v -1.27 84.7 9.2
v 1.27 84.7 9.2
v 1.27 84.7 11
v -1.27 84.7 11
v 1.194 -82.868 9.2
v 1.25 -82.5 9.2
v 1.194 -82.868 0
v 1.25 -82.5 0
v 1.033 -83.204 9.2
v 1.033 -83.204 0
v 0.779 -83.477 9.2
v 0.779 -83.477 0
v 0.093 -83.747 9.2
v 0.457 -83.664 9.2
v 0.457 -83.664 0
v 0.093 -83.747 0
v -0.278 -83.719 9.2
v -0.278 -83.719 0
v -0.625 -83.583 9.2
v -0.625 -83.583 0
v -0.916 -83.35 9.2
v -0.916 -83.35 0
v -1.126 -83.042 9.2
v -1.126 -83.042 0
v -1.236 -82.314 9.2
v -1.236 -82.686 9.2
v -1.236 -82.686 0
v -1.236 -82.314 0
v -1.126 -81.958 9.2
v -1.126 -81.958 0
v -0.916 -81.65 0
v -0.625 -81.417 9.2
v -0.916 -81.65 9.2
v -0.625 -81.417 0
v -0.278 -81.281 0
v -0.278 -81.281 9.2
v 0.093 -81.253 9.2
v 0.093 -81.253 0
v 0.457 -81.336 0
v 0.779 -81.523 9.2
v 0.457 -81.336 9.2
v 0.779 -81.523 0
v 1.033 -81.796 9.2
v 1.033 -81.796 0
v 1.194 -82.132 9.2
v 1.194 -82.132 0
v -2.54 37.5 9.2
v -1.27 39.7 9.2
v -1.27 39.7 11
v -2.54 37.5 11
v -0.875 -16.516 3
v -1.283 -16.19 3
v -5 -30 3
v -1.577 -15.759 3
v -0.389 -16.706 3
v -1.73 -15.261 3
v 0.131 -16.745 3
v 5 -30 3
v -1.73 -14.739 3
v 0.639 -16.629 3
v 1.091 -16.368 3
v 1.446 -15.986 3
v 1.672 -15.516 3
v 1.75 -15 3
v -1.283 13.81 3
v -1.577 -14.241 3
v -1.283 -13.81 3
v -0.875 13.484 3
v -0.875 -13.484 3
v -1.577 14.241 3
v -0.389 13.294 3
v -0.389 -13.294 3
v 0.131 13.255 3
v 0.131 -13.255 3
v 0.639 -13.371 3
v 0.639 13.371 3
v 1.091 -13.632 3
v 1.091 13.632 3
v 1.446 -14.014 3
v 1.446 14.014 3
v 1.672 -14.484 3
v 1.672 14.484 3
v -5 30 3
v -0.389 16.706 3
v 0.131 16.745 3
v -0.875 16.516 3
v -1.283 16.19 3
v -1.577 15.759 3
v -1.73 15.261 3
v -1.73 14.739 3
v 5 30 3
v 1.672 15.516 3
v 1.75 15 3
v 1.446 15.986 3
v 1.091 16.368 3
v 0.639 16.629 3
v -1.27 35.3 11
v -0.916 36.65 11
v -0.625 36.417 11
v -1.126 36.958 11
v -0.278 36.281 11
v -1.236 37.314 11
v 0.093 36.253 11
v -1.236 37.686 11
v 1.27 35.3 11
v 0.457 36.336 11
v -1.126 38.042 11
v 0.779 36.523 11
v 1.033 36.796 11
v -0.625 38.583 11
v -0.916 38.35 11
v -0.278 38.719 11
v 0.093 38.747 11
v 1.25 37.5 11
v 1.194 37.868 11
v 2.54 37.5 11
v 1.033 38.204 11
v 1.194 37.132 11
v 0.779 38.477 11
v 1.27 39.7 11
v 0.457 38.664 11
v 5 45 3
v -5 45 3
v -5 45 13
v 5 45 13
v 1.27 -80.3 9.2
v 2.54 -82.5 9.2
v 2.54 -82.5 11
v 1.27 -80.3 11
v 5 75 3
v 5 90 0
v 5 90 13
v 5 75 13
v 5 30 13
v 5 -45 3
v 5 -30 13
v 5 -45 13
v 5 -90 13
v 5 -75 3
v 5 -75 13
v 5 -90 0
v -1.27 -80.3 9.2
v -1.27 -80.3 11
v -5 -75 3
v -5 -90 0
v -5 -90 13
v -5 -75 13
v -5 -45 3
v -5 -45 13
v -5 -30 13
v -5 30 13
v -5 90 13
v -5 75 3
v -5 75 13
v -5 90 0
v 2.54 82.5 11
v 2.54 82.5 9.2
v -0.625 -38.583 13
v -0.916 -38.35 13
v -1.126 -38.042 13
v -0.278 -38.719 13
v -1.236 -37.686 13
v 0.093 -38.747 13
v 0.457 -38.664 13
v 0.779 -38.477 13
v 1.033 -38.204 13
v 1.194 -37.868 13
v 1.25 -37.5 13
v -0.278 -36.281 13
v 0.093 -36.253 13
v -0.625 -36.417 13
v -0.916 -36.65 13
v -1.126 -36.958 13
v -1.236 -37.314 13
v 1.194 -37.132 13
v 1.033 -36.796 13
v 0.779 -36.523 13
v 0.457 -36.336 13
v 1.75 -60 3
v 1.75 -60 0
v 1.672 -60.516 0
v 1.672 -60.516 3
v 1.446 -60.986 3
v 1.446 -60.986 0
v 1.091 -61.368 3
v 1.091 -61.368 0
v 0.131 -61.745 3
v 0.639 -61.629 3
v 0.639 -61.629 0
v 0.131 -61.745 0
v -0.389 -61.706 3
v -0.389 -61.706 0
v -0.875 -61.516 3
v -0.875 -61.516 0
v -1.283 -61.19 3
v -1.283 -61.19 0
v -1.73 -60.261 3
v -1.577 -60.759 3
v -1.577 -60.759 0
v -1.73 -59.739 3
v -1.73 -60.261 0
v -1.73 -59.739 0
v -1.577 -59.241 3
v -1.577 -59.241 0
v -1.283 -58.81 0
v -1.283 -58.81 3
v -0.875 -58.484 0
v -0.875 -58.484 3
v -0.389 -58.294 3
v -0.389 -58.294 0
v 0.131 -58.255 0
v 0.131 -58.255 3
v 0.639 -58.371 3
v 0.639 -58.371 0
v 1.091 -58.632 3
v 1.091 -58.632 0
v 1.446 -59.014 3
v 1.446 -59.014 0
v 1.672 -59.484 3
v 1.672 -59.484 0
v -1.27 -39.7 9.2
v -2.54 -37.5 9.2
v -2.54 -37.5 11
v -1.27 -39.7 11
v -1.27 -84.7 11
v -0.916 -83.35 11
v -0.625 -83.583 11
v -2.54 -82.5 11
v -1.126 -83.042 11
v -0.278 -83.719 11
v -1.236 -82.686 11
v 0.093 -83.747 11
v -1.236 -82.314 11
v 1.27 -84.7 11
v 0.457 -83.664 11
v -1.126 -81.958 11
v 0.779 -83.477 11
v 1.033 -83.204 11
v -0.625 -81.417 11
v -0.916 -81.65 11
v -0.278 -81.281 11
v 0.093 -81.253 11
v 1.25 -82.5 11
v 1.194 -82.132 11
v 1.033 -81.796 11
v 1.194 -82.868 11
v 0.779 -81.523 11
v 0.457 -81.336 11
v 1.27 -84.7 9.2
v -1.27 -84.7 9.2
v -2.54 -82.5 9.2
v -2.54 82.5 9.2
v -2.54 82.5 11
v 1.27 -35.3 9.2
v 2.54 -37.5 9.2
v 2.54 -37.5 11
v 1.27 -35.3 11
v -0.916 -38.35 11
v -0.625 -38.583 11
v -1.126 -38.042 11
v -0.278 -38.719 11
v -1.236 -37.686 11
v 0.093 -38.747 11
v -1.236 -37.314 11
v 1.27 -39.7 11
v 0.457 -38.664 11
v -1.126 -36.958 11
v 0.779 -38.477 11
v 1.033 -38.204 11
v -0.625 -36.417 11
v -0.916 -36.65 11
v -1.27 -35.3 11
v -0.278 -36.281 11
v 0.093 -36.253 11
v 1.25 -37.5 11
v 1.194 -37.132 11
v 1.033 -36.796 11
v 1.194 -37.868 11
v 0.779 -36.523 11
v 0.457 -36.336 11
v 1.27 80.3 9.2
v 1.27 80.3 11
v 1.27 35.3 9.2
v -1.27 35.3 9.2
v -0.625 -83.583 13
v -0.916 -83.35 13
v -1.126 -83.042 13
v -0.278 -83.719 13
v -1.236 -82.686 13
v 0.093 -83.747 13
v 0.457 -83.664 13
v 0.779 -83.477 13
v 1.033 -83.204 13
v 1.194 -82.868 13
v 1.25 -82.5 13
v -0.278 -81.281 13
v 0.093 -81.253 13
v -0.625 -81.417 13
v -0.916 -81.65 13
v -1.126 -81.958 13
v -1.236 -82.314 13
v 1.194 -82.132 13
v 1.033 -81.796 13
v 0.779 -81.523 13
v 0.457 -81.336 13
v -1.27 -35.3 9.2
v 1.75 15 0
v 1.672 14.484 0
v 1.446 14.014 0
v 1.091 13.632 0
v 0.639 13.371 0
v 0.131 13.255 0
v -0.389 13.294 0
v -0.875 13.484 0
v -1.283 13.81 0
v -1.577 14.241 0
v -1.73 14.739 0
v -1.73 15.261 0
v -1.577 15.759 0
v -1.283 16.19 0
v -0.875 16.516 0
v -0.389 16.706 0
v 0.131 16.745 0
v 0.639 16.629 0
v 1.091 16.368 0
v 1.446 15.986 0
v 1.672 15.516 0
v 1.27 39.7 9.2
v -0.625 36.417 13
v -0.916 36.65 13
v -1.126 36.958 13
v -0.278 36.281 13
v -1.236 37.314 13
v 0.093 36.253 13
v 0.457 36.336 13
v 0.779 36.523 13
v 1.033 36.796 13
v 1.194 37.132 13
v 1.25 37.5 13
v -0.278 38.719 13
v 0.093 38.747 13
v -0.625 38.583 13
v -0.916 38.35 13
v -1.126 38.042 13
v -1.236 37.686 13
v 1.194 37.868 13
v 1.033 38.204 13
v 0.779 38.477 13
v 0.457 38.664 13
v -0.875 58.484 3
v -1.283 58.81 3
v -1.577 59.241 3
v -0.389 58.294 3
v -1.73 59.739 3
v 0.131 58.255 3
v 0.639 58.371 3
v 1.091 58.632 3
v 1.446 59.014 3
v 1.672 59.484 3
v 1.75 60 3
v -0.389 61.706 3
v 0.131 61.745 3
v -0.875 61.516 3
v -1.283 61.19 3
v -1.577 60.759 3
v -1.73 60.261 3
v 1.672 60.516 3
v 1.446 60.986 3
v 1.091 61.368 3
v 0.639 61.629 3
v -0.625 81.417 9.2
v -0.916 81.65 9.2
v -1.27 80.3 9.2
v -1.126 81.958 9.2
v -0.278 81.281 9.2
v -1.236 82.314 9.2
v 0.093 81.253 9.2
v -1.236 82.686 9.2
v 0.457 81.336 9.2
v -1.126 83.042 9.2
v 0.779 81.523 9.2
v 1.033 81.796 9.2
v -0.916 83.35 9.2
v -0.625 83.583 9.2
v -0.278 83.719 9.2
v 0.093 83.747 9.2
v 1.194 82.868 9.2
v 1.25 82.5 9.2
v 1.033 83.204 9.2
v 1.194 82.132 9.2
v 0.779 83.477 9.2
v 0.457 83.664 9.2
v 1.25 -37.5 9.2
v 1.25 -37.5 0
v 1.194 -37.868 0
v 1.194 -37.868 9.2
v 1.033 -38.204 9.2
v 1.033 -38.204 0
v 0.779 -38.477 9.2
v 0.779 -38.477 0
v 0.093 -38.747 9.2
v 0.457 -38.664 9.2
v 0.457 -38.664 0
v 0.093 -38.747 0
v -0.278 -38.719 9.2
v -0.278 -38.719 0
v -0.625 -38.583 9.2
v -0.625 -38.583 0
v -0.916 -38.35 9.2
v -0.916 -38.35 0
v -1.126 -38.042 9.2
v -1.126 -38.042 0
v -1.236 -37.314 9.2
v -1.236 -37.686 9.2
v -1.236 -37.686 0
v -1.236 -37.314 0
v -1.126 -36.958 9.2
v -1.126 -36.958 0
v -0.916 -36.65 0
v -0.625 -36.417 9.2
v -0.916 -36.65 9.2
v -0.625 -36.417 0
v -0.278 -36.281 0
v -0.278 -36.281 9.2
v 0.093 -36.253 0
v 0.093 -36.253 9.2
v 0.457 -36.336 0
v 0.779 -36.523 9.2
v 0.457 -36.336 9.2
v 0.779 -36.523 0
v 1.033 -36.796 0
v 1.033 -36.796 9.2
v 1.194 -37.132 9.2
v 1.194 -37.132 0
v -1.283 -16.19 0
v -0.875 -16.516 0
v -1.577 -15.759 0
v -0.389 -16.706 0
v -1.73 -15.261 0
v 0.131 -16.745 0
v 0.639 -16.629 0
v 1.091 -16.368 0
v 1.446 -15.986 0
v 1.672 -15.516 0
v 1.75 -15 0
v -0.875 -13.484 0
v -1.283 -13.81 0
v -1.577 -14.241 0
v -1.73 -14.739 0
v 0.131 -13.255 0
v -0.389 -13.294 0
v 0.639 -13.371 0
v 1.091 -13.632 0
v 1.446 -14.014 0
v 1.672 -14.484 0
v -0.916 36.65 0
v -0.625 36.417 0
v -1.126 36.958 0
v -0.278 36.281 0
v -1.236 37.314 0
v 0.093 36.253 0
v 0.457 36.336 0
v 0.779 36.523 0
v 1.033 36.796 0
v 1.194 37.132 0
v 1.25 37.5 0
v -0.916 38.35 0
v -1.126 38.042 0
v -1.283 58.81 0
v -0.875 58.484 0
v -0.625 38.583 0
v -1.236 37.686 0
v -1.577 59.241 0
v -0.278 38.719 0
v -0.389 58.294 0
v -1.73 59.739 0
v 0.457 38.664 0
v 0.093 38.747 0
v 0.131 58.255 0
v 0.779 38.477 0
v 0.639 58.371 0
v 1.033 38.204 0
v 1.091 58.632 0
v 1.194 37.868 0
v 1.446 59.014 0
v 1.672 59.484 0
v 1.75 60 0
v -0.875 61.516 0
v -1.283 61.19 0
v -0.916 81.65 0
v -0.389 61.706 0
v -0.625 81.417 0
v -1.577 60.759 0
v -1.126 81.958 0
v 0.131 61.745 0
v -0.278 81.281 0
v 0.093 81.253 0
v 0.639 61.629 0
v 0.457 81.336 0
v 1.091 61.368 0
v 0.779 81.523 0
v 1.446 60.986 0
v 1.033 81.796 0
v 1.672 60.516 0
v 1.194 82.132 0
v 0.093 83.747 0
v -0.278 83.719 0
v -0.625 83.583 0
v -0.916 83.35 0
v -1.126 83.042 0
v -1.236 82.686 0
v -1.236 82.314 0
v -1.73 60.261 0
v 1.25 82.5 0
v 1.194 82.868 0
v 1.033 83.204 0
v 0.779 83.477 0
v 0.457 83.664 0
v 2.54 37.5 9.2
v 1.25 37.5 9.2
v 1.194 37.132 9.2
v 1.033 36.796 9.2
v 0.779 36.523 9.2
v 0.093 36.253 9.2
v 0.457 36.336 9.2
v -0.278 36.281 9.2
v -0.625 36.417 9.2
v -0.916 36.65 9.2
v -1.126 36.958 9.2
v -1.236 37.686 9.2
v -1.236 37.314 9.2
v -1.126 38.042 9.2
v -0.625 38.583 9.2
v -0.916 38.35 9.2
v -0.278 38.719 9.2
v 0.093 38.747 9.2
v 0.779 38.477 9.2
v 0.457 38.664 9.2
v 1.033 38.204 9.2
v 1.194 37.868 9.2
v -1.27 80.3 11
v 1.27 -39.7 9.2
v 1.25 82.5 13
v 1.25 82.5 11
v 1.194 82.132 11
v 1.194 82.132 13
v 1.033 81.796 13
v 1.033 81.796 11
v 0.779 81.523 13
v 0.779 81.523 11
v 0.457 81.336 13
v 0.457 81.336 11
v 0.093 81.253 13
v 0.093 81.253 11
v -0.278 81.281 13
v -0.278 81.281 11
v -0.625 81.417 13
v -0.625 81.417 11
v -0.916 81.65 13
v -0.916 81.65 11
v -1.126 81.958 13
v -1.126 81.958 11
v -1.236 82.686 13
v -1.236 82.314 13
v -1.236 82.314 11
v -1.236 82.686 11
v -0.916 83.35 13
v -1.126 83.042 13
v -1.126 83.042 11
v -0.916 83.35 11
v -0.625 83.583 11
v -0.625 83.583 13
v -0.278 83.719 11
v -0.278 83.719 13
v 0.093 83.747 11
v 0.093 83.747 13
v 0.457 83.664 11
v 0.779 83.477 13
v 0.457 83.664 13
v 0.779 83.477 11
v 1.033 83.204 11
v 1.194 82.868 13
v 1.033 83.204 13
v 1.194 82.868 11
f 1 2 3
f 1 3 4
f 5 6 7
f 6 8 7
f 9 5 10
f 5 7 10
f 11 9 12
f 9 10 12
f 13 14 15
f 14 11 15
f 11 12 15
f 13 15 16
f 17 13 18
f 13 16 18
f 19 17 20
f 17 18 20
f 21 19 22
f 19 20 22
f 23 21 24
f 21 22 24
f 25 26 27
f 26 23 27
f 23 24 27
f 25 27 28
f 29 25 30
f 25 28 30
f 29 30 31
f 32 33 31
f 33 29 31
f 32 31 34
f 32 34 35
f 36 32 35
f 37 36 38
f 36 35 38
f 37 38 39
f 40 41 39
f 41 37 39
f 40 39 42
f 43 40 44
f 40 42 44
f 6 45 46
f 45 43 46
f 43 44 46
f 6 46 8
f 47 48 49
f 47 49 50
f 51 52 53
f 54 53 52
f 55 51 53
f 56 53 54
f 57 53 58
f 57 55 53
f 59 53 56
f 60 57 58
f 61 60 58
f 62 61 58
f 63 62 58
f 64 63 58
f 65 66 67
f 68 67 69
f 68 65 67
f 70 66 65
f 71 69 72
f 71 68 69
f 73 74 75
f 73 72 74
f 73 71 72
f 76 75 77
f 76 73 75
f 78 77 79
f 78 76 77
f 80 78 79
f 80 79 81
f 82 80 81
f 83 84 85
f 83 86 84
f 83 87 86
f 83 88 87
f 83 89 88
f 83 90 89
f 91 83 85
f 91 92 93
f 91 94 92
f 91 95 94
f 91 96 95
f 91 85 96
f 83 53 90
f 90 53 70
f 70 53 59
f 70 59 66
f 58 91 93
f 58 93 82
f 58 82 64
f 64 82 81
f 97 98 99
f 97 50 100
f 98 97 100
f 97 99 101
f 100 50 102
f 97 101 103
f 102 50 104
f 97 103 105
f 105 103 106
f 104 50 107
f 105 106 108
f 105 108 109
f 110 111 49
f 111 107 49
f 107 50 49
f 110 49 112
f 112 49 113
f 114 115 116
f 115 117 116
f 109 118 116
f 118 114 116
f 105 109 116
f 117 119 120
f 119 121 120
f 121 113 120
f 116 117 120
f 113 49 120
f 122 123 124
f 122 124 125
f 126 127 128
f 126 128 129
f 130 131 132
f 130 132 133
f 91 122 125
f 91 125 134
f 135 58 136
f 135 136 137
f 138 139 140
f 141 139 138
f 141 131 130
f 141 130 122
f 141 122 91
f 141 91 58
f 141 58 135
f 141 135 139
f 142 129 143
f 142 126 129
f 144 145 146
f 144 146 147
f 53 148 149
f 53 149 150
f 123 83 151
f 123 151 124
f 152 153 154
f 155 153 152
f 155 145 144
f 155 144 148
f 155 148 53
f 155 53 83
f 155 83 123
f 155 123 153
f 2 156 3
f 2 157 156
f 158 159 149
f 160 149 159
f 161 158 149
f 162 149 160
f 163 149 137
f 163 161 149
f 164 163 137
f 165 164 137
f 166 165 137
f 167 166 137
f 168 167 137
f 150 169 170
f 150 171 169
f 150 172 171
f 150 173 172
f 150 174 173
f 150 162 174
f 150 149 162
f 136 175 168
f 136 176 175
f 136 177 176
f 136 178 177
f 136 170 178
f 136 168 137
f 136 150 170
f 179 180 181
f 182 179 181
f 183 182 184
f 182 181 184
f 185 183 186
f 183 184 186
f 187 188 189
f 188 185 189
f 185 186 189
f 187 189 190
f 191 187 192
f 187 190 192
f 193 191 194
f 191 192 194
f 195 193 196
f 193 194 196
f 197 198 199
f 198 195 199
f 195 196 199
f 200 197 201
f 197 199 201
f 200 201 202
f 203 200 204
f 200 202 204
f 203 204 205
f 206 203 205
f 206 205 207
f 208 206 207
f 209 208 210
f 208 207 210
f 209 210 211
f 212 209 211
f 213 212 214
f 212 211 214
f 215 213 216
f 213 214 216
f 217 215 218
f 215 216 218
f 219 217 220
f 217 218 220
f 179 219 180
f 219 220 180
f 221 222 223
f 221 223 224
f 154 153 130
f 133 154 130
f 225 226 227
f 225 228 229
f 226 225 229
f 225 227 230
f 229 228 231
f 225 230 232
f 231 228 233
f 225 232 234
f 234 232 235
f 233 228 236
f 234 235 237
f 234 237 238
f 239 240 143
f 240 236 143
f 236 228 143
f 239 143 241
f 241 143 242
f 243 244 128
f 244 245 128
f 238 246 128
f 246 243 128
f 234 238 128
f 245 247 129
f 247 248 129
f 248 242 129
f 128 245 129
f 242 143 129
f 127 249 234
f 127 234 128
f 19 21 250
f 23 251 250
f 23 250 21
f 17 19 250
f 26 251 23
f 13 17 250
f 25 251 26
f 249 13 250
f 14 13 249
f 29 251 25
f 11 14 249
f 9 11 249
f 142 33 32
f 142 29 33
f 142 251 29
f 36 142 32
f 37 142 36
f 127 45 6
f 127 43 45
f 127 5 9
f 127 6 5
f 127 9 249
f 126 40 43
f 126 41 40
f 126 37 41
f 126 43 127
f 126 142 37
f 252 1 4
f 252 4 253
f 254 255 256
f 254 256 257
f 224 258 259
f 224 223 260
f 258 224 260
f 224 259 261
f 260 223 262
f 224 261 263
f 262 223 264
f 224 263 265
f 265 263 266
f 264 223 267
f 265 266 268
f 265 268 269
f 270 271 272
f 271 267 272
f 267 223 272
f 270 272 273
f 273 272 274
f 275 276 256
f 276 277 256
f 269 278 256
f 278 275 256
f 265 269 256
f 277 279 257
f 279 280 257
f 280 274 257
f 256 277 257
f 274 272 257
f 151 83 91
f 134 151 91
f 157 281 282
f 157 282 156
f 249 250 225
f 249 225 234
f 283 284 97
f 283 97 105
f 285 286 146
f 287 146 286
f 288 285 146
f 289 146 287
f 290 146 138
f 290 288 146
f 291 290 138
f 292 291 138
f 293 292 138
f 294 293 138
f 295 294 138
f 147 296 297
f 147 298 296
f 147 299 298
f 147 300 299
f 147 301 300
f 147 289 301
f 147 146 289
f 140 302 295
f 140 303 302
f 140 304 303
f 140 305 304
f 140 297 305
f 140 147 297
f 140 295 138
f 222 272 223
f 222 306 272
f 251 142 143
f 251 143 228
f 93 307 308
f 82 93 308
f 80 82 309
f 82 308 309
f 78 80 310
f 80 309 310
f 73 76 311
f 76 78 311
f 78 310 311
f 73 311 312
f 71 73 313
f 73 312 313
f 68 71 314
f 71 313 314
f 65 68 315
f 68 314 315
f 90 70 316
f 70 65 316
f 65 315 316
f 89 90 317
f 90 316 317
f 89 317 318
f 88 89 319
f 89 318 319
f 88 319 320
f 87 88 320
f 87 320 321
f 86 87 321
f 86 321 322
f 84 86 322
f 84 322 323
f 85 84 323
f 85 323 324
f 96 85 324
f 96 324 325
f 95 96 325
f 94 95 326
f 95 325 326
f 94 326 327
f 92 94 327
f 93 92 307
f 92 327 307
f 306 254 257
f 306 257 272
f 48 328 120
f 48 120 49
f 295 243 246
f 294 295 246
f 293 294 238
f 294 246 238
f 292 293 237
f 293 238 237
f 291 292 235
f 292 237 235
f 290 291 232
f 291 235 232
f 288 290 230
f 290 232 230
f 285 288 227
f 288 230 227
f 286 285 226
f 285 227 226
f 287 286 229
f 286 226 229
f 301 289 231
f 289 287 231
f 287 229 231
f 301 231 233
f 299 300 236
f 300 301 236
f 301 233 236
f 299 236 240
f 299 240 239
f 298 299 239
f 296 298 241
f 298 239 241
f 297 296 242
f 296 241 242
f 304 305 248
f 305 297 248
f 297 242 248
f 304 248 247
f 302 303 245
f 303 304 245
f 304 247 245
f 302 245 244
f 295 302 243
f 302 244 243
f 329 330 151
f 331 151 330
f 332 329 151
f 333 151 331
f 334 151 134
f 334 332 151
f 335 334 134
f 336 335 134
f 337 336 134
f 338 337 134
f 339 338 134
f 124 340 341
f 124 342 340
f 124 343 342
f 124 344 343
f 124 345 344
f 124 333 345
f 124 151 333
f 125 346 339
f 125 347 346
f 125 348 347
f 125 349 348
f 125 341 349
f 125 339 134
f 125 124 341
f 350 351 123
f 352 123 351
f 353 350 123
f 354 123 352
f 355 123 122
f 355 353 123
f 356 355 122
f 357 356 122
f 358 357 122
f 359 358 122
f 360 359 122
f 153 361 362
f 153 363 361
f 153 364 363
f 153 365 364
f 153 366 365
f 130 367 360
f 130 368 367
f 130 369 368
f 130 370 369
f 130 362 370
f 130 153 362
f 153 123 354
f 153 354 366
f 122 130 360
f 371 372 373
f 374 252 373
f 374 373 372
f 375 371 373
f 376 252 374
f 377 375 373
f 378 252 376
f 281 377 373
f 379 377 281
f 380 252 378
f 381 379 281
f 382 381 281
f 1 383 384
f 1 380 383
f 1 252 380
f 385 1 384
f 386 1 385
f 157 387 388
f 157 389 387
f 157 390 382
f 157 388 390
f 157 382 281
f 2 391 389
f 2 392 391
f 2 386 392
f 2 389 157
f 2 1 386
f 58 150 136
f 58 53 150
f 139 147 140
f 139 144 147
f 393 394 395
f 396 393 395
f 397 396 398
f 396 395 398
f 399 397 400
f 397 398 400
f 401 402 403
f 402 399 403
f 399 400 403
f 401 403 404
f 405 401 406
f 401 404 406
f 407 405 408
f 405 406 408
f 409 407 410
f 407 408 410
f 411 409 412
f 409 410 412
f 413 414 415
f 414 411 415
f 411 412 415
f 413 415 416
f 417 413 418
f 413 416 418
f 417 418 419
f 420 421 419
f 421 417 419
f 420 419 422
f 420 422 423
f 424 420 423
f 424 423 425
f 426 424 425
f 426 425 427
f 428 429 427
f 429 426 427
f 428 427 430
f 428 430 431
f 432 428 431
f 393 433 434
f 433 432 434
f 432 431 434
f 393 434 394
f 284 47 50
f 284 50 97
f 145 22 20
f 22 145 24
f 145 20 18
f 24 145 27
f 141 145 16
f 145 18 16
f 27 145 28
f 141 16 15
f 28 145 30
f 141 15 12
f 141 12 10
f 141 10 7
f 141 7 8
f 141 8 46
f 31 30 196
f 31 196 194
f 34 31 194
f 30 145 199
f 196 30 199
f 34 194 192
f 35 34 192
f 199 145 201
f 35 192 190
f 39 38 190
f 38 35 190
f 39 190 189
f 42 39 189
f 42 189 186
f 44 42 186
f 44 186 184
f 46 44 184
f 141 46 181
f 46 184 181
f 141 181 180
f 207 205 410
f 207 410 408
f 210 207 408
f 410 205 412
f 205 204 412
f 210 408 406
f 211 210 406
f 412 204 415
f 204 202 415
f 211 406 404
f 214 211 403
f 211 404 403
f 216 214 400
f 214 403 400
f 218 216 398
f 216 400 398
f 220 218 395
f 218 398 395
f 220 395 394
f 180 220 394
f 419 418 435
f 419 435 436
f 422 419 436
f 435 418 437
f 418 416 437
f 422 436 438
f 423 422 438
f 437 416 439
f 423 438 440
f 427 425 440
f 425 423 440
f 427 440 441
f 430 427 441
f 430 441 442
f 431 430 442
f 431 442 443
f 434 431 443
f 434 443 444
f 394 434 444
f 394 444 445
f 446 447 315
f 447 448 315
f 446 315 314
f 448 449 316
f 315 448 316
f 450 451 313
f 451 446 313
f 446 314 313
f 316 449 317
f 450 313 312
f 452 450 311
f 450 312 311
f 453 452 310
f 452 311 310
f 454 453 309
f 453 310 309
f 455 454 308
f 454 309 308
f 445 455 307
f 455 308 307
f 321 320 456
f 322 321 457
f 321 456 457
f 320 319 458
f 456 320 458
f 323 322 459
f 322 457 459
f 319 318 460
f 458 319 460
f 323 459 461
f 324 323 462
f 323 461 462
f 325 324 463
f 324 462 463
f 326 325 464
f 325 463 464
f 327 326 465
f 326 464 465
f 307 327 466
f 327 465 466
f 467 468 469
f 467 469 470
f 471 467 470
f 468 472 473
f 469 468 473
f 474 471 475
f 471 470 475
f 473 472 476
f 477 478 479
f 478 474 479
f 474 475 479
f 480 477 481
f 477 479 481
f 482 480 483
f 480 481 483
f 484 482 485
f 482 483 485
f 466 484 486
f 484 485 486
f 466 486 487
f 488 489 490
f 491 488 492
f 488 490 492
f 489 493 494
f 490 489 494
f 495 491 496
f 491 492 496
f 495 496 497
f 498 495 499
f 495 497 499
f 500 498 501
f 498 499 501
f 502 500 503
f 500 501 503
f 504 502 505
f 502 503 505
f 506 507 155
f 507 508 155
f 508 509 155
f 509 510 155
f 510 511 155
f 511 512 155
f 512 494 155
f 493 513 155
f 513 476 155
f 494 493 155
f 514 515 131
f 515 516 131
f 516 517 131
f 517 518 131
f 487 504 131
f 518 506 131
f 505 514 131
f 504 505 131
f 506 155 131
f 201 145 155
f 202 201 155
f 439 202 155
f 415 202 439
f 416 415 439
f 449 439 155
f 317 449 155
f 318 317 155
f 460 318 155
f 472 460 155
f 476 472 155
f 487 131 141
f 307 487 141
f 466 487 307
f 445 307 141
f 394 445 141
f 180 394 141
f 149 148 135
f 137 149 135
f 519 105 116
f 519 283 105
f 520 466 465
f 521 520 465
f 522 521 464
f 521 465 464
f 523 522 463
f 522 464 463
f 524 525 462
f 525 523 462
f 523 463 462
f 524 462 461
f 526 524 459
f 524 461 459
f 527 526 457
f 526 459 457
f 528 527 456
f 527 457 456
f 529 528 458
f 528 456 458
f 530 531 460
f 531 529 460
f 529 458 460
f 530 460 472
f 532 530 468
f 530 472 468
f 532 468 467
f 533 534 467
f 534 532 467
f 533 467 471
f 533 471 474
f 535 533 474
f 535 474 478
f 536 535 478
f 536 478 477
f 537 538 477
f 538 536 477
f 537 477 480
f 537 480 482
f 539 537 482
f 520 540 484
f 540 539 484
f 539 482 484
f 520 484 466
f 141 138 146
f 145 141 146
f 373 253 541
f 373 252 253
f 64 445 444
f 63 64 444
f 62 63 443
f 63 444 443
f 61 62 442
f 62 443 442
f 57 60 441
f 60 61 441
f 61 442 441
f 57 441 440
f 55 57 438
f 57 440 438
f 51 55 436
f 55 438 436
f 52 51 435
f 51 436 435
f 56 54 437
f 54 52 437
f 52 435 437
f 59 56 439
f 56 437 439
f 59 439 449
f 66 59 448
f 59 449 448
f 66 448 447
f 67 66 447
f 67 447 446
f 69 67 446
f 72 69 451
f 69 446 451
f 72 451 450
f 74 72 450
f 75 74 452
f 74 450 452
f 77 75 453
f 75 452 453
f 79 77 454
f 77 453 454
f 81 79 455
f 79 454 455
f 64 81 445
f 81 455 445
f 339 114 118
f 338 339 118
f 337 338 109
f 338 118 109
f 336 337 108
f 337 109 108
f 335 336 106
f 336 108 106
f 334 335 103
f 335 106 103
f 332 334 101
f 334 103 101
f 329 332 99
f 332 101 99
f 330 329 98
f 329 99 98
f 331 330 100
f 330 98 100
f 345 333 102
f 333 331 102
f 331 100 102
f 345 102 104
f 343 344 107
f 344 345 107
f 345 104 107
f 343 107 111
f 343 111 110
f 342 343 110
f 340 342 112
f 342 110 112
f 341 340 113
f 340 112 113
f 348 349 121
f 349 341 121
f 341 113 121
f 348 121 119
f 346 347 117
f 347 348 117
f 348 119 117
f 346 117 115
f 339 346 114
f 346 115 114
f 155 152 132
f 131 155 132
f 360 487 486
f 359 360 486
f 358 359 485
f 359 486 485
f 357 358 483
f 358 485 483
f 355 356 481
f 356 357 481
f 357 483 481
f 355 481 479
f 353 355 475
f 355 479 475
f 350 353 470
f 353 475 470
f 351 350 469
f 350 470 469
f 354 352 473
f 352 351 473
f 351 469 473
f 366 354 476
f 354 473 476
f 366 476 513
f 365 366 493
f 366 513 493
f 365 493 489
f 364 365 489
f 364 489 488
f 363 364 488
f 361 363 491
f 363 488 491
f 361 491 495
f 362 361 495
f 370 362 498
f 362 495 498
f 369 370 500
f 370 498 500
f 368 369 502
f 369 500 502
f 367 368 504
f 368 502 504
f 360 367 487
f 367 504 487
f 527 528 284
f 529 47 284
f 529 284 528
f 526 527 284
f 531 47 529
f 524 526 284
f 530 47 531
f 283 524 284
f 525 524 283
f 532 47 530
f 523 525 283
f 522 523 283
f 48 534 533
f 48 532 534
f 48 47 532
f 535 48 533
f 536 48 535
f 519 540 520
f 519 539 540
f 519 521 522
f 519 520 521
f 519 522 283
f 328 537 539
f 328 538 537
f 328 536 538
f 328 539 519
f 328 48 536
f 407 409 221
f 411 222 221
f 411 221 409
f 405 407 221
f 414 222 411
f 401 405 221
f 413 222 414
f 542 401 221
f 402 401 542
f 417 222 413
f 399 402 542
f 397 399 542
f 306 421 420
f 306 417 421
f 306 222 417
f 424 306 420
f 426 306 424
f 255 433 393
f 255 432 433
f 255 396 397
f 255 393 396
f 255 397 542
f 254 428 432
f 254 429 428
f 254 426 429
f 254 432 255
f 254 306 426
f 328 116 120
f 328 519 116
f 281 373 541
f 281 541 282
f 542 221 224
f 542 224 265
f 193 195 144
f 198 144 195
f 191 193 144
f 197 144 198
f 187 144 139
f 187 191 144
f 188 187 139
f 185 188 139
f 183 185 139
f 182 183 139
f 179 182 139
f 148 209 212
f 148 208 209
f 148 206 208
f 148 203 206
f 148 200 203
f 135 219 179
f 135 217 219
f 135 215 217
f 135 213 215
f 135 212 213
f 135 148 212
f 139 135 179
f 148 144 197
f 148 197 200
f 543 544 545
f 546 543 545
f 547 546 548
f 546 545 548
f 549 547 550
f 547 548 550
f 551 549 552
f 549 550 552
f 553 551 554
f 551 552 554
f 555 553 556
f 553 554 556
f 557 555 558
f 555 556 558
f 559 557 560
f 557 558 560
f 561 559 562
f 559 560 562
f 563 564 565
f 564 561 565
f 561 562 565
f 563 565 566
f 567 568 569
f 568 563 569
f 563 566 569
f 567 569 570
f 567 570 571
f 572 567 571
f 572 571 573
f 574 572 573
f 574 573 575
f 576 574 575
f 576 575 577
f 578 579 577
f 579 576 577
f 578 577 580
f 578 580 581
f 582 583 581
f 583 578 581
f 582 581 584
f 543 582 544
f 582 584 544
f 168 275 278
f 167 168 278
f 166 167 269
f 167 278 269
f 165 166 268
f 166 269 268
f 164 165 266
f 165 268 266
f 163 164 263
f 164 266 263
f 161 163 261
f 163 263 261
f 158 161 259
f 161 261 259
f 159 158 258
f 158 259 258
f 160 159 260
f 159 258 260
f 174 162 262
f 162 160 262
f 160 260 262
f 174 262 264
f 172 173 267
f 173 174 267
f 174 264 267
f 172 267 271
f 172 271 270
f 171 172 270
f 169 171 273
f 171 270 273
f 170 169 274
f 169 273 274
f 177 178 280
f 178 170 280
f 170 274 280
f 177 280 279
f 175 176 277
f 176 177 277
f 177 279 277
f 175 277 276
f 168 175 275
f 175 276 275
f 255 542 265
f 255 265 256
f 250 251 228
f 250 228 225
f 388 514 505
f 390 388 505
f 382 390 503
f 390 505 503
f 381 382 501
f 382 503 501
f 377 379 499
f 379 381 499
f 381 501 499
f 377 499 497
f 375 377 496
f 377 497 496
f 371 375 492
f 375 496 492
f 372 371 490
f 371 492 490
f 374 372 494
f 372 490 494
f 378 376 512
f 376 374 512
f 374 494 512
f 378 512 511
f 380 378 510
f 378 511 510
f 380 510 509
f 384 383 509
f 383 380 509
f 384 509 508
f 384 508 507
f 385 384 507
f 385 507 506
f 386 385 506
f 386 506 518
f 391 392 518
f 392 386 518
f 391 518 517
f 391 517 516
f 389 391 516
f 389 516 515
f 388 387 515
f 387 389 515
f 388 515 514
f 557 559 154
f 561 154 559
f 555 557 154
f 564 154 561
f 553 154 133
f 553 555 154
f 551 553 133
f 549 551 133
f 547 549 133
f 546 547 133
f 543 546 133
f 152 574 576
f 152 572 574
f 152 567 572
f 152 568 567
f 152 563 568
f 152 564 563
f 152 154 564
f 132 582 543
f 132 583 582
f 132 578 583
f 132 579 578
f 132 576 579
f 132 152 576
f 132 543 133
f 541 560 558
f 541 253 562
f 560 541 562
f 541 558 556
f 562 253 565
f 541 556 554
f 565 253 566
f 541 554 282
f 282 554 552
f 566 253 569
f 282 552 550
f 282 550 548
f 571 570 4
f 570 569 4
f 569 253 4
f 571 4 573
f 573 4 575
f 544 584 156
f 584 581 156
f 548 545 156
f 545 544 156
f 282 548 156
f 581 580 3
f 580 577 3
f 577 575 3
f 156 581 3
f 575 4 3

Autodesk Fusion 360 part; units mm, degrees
sketch "Skizze1" plane through (0, 0, 0) normal (0, 0, 1) x (1, 0, 0)
  line L0 (0, 118.8766) -> (0, -120.4869) construction
  line L1 (5, -90) -> (-5, -90)
  line L2 (-5, -90) -> (-5, 90)
  line L3 (-5, 90) -> (5, 90)
  line L4 (5, 90) -> (5, -90)
  line L5 (5, -90) -> (-5, 90) construction
  line L6 (-5, -90) -> (5, 90) construction
  circle A0 centre (0, 37.5) radius 1.25
  circle A1 centre (0, -37.5) radius 1.25
  circle A2 centre (0, 15) radius 1.75
  circle A3 centre (0, -15) radius 1.75
  circle A4 centre (0, 60) radius 1.75
  circle A5 centre (0, -60) radius 1.75
  line L7 (-5, 30) -> (5, 30)
  line L8 (-5, -30) -> (5, -30)
  line L9 (-5, -45) -> (5, -45)
  line L10 (-5, 45) -> (5, 45)
  line L11 (1.2702, -39.7) -> (2.5403, -37.5)
  line L12 (2.5403, -37.5) -> (1.2702, -35.3)
  line L13 (1.2702, -35.3) -> (-1.2702, -35.3)
  line L14 (-1.2702, -35.3) -> (-2.5403, -37.5)
  line L15 (-2.5403, -37.5) -> (-1.2702, -39.7)
  line L16 (-1.2702, -39.7) -> (1.2702, -39.7)
  line L17 (1.2702, 35.3) -> (2.5403, 37.5)
  line L18 (2.5403, 37.5) -> (1.2702, 39.7)
  line L19 (1.2702, 39.7) -> (-1.2702, 39.7)
  line L20 (-1.2702, 39.7) -> (-2.5403, 37.5)
  line L21 (-2.5403, 37.5) -> (-1.2702, 35.3)
  line L22 (-1.2702, 35.3) -> (1.2702, 35.3)
  circle A6 centre (0, 82.5) radius 1.25
  circle A7 centre (0, -82.5) radius 1.25
  line L23 (1.2702, 80.3) -> (2.5403, 82.5)
  line L24 (2.5403, 82.5) -> (1.2702, 84.7)
  line L25 (1.2702, 84.7) -> (-1.2702, 84.7)
  line L26 (-1.2702, 84.7) -> (-2.5403, 82.5)
  line L27 (-2.5403, 82.5) -> (-1.2702, 80.3)
  line L28 (-1.2702, 80.3) -> (1.2702, 80.3)
  line L29 (1.2702, -84.7) -> (2.5403, -82.5)
  line L30 (2.5403, -82.5) -> (1.2702, -80.3)
  line L31 (1.2702, -80.3) -> (-1.2702, -80.3)
  line L32 (-1.2702, -80.3) -> (-2.5403, -82.5)
  line L33 (-2.5403, -82.5) -> (-1.2702, -84.7)
  line L34 (-1.2702, -84.7) -> (1.2702, -84.7)
  line L35 (-5, -75) -> (5, -75)
  line L36 (-5, 75) -> (5, 75)
  point P0 (0, -37.5)
  point P1 (0, 37.5)
  point P2 (0, 82.5)
  point P3 (0, -82.5)
  dimension "d1" = 10
  dimension "d2" = 180
  dimension "d3" = 37.5
  dimension "d4" = 37.5
  dimension "d5" = 2.5
  dimension "d7" = 2.5
  dimension "d8" = 3.5
  dimension "d9" = 3.5
  dimension "d10" = 15
  dimension "d11" = 15
  dimension "d12" = 3.5
  dimension "d13" = 3.5
  dimension "d14" = 45
  dimension "d15" = 45
  dimension "d16" = 7.5
  dimension "d17" = 7.5
  dimension "d20" = 4.4
  dimension "d21" = 4.4
  dimension "d33" = 2.5
  dimension "d34" = 2.5
  dimension "d35" = 4.4
  dimension "d36" = 4.4
  dimension "d37" = 45
  dimension "d38" = 45
  dimension "d39" = 7.5
  dimension "d40" = 7.5
  dimension "d41" = 7.5
  dimension "d42" = 7.5
  dimension "d43" = 7.5
extrude "Extrusion1" add sketch "Skizze1" along normal blind 3 contours L1 L2 L4 L35 | L2 L4 L9 L35 | L2 L4 L8 L9 | L2 L4 L7 L8 | L2 L4 L7 L10 | L2 L4 L10 L36 | L2 L3 L4 L36 | L11 L12 L13 L14 L15 L16 | L17 L18 L19 L20 L21 L22 | L23 L24 L25 L26 L27 L28 | L29 L30 L31 L32 L33 L34
extrude "Extrusion2" add sketch "Skizze1" along normal blind 13 contours L1 L2 L4 L35 | L2 L4 L8 L9 | L2 L4 L7 L10 | L2 L3 L4 L36 | L11 L12 L13 L14 L15 L16 | L17 L18 L19 L20 L21 L22 | L23 L24 L25 L26 L27 L28 | L29 L30 L31 L32 L33 L34
extrude "Extrusion3" cut sketch "Skizze1" along normal blind 11 contours L11 L12 L13 L14 L15 L16 | L17 L18 L19 L20 L21 L22 | L23 L24 L25 L26 L27 L28 | L29 L30 L31 L32 L33 L34
extrude "Extrusion4" add sketch "Skizze1" along normal blind 9.2 contours L11 L12 L13 L14 L15 L16 | L17 L18 L19 L20 L21 L22 | L23 L24 L25 L26 L27 L28 | L29 L30 L31 L32 L33 L34
equation "d3 = ( 75 / 2 ) * 1 mm"
equation "d4 = ( 75 / 2 ) * 1 mm"
